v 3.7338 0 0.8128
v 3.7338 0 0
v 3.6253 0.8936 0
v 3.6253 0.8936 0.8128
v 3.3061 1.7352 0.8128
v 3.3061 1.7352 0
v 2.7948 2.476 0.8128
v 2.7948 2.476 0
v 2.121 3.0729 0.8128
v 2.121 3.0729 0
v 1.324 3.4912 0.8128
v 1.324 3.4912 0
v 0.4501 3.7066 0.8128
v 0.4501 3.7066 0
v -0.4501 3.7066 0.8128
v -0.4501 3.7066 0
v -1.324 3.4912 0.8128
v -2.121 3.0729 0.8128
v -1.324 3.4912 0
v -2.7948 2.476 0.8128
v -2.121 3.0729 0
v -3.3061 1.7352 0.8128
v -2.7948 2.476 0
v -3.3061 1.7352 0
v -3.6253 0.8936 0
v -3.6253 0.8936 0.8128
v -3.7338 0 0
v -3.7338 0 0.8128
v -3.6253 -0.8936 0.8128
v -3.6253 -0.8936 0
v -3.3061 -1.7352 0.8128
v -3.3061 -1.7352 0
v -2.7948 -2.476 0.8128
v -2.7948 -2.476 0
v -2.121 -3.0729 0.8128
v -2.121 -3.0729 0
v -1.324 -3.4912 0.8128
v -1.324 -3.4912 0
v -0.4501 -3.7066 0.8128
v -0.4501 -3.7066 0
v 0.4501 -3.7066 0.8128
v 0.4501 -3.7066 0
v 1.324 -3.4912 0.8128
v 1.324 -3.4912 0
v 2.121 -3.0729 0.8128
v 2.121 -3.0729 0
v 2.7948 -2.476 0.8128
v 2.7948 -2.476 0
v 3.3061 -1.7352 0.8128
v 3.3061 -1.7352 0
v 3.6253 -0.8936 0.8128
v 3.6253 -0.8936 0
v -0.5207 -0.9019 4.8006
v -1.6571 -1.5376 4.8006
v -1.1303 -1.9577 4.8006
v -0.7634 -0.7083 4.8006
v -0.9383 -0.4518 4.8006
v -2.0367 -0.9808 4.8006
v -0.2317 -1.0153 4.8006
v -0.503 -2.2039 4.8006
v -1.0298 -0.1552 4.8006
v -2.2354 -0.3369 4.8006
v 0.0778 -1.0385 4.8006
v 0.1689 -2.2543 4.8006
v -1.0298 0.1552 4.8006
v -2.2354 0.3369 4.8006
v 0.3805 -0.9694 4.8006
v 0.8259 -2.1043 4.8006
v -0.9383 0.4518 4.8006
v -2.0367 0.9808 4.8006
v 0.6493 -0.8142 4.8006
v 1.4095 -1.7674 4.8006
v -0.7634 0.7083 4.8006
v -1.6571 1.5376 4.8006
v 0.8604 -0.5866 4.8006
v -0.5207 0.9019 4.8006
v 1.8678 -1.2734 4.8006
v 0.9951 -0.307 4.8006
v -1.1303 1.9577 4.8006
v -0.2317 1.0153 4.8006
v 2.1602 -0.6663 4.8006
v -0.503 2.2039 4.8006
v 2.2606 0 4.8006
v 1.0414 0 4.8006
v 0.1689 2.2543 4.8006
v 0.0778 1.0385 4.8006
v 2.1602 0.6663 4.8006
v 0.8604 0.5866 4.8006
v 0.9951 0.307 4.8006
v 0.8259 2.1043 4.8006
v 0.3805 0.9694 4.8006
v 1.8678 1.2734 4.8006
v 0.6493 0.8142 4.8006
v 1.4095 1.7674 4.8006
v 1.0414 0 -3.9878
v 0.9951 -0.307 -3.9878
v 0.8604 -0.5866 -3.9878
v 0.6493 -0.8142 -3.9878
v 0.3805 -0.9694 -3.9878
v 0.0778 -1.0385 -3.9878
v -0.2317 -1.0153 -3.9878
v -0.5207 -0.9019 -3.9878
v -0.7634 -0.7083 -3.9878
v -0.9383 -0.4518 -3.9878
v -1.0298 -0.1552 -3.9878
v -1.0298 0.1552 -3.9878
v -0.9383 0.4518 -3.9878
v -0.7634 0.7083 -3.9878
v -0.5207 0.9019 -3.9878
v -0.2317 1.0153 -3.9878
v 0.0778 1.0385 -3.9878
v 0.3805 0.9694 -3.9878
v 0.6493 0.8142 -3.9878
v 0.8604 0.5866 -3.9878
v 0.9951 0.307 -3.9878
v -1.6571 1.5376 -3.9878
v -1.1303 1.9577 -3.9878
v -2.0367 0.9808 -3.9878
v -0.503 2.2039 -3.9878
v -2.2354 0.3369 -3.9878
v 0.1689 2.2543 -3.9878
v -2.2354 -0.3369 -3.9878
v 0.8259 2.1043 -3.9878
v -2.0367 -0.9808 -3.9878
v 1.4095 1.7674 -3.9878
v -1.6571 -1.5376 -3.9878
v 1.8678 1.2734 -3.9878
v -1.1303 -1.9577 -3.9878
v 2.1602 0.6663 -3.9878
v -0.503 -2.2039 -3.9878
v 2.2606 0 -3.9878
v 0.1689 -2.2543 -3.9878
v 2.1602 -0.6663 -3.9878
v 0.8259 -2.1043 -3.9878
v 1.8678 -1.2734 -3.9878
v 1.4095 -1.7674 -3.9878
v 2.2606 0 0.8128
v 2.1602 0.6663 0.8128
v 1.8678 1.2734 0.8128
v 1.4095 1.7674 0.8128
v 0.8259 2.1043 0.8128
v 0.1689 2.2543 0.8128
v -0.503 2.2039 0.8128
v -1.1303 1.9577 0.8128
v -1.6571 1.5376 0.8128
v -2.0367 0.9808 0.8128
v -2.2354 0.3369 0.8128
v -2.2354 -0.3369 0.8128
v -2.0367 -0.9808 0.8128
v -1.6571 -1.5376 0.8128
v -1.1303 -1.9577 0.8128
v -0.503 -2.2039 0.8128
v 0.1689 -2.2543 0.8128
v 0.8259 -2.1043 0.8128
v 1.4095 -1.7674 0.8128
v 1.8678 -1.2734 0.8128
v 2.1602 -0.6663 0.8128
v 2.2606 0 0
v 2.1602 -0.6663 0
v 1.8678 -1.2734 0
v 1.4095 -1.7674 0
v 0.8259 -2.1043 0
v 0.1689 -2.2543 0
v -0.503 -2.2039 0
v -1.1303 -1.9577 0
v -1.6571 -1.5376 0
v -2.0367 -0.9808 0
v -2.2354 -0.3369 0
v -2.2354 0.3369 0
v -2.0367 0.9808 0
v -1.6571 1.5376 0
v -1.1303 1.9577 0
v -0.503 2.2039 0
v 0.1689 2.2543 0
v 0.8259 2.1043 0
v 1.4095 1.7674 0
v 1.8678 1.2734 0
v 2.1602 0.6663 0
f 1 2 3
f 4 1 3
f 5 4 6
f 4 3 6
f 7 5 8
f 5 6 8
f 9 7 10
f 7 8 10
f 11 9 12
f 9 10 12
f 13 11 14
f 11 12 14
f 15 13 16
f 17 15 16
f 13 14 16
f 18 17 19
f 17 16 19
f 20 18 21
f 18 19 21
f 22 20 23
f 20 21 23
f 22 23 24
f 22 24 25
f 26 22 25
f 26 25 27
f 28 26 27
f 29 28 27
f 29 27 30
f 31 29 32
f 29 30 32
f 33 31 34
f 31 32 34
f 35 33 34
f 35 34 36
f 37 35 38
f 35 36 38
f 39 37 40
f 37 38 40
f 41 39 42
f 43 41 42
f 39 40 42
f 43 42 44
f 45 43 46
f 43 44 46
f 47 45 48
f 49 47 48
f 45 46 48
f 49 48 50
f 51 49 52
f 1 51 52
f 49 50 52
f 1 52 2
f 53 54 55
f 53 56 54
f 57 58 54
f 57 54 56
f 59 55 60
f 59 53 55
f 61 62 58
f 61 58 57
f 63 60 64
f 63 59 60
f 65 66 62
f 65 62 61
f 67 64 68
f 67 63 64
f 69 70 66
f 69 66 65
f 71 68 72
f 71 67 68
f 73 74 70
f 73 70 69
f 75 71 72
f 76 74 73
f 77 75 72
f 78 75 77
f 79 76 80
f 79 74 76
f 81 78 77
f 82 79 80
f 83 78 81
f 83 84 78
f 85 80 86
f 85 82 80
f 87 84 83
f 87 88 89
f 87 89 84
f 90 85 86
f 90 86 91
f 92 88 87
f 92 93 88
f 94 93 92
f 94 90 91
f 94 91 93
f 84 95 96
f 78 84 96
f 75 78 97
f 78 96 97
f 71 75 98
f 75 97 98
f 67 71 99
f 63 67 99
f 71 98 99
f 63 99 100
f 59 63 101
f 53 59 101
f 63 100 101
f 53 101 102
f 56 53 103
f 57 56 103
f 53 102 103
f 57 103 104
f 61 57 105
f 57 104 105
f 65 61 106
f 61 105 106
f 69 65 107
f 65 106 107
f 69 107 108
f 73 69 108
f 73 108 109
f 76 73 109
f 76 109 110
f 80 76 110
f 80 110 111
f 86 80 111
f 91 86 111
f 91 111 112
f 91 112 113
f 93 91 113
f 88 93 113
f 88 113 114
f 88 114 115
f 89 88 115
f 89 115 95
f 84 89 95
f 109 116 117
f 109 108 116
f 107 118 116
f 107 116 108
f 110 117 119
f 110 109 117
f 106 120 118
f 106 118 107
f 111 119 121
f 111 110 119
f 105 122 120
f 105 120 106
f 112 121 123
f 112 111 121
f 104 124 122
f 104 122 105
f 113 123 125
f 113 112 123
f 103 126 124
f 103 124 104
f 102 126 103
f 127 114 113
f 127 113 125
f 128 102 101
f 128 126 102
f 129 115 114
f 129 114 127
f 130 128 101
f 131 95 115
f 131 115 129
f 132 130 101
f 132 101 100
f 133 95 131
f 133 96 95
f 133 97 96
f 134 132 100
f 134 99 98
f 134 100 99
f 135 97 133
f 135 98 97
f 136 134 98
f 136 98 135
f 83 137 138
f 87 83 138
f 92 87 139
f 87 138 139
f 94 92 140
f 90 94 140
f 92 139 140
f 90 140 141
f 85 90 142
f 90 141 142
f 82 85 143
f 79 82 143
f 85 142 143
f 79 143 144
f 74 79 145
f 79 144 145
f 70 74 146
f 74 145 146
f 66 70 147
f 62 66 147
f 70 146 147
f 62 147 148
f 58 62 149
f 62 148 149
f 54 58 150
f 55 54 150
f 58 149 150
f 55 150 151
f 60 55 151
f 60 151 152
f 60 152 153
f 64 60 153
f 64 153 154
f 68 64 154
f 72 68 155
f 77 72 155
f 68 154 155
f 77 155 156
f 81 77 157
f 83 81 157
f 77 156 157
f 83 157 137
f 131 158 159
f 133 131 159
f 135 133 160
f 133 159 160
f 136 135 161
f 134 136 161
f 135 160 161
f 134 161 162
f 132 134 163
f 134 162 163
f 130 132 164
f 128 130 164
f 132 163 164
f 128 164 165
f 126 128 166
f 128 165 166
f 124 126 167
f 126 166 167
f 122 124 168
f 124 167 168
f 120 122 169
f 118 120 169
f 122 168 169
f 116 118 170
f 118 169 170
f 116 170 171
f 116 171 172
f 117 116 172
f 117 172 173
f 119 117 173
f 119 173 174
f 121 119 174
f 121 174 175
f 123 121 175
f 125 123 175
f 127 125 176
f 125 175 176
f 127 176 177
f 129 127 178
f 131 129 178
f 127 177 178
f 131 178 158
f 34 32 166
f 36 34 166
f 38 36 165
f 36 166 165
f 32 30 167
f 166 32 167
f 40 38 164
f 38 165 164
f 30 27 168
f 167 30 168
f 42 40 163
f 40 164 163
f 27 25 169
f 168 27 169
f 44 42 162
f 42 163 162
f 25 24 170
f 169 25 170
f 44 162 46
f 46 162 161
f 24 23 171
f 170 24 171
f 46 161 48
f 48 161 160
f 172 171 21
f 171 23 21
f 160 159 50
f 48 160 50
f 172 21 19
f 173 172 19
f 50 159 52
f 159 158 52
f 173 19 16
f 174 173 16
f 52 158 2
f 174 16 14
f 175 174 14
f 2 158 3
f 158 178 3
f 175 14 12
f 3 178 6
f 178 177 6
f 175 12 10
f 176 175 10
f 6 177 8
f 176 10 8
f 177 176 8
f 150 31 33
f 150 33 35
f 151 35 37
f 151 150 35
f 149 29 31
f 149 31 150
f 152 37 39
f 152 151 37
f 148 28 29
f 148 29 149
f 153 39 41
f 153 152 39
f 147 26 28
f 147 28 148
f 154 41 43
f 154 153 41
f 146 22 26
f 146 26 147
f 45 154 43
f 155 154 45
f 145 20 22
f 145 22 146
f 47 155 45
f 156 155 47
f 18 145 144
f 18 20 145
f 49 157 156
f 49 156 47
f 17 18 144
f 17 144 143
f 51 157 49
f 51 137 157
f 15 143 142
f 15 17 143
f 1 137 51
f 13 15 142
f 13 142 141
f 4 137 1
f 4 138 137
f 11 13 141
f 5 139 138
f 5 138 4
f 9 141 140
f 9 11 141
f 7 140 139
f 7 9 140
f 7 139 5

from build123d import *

# Parameters (mm, degrees)
F0_R     = 3.7338
F1_DEPTH = 0.8128
F2_R     = 2.2606
F3_DEPTH = 3.9878
F4_R     = 2.2606
F5_DEPTH = 3.9878
F6_R     = 1.0414
F7_DEPTH = 25.4


with BuildPart() as f1:
    # F0 (on Top) → F1 (new body)
    with BuildSketch(Plane.XY):
        Circle(F0_R)
    extrude(amount=F1_DEPTH)

    # F2 (on face) → F3 (join)
    with BuildSketch(Plane.XY.offset(0.8128)):
        Circle(F2_R)
    extrude(amount=F3_DEPTH)

    # F4 (on face) → F5 (join)
    with BuildSketch(Plane(origin=(0, 0, 0), x_dir=(1, 0, 0), z_dir=(0, 0, -1))):
        Circle(F4_R)
    extrude(amount=F5_DEPTH)

    # F6 (on face) → F7 (cut)
    with BuildSketch(Plane(origin=(0, 0, -3.9878), x_dir=(1, 0, 0), z_dir=(0, 0, -1))):
        Circle(F6_R)
    extrude(amount=-F7_DEPTH, mode=Mode.SUBTRACT)


solid = f1.part
